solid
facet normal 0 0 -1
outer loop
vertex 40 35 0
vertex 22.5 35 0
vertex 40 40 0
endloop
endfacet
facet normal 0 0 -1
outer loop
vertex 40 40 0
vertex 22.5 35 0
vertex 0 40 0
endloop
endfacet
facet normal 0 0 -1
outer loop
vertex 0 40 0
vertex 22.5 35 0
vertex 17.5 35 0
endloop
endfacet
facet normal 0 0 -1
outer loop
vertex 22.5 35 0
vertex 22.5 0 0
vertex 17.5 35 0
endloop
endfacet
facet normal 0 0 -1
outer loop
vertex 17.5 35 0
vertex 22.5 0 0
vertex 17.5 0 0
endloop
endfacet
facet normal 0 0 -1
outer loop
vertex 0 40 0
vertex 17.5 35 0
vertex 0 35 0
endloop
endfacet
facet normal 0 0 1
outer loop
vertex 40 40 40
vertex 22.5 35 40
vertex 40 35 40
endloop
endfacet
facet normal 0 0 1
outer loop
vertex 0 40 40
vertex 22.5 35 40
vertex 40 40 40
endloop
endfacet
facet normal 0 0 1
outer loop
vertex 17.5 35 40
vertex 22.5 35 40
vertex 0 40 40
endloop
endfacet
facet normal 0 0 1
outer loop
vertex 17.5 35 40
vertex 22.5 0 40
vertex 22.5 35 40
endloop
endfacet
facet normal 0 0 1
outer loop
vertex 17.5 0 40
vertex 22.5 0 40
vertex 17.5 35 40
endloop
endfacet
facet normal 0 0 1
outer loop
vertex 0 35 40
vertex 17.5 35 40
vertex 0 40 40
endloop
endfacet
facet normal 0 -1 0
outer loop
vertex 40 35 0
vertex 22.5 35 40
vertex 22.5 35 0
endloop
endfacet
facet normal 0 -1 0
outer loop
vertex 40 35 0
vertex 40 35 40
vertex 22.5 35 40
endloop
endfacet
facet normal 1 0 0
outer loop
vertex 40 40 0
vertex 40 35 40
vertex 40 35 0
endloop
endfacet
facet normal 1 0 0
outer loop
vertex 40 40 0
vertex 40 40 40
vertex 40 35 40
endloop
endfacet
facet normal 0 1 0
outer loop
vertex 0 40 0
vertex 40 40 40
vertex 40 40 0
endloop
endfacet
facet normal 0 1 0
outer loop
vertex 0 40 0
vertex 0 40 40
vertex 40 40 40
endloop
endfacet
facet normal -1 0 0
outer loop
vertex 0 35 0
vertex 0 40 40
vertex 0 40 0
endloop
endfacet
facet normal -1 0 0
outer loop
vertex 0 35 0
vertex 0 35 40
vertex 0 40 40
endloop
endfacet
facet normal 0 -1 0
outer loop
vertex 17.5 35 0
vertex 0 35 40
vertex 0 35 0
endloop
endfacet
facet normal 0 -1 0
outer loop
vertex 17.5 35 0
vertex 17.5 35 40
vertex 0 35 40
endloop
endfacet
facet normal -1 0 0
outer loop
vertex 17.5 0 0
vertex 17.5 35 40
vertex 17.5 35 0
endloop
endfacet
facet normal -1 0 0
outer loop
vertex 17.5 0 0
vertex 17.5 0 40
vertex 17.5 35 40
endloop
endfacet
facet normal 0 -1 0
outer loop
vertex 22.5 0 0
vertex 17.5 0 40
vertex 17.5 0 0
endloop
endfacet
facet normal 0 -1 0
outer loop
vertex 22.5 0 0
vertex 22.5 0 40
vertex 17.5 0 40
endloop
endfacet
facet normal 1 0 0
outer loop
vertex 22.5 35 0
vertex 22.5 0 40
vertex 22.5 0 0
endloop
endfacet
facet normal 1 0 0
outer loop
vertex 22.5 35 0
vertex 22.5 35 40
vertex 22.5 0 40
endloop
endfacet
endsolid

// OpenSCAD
$fn = 32;

// ----------------------------------------------------------------------
// Structural section: tee 40 x 40 mm
// ----------------------------------------------------------------------

// --- parameters (mm) ---
sec_w = 40;               // tee width, X
sec_h = 40;               // tee height, Y
flange_t = 5;             // top flange thickness
web_t = 5;                // web thickness
plate_t = 40;             // cut length, Z (extrusion height)

profile = [[17.5, 0], [22.5, 0], [22.5, 35], [40, 35], [40, 40], [0, 40], [0, 35], [17.5, 35]];  // primary outline, 8 points, counter clockwise

// --- the one profile operation ---
linear_extrude(height = plate_t) polygon(points = profile);
